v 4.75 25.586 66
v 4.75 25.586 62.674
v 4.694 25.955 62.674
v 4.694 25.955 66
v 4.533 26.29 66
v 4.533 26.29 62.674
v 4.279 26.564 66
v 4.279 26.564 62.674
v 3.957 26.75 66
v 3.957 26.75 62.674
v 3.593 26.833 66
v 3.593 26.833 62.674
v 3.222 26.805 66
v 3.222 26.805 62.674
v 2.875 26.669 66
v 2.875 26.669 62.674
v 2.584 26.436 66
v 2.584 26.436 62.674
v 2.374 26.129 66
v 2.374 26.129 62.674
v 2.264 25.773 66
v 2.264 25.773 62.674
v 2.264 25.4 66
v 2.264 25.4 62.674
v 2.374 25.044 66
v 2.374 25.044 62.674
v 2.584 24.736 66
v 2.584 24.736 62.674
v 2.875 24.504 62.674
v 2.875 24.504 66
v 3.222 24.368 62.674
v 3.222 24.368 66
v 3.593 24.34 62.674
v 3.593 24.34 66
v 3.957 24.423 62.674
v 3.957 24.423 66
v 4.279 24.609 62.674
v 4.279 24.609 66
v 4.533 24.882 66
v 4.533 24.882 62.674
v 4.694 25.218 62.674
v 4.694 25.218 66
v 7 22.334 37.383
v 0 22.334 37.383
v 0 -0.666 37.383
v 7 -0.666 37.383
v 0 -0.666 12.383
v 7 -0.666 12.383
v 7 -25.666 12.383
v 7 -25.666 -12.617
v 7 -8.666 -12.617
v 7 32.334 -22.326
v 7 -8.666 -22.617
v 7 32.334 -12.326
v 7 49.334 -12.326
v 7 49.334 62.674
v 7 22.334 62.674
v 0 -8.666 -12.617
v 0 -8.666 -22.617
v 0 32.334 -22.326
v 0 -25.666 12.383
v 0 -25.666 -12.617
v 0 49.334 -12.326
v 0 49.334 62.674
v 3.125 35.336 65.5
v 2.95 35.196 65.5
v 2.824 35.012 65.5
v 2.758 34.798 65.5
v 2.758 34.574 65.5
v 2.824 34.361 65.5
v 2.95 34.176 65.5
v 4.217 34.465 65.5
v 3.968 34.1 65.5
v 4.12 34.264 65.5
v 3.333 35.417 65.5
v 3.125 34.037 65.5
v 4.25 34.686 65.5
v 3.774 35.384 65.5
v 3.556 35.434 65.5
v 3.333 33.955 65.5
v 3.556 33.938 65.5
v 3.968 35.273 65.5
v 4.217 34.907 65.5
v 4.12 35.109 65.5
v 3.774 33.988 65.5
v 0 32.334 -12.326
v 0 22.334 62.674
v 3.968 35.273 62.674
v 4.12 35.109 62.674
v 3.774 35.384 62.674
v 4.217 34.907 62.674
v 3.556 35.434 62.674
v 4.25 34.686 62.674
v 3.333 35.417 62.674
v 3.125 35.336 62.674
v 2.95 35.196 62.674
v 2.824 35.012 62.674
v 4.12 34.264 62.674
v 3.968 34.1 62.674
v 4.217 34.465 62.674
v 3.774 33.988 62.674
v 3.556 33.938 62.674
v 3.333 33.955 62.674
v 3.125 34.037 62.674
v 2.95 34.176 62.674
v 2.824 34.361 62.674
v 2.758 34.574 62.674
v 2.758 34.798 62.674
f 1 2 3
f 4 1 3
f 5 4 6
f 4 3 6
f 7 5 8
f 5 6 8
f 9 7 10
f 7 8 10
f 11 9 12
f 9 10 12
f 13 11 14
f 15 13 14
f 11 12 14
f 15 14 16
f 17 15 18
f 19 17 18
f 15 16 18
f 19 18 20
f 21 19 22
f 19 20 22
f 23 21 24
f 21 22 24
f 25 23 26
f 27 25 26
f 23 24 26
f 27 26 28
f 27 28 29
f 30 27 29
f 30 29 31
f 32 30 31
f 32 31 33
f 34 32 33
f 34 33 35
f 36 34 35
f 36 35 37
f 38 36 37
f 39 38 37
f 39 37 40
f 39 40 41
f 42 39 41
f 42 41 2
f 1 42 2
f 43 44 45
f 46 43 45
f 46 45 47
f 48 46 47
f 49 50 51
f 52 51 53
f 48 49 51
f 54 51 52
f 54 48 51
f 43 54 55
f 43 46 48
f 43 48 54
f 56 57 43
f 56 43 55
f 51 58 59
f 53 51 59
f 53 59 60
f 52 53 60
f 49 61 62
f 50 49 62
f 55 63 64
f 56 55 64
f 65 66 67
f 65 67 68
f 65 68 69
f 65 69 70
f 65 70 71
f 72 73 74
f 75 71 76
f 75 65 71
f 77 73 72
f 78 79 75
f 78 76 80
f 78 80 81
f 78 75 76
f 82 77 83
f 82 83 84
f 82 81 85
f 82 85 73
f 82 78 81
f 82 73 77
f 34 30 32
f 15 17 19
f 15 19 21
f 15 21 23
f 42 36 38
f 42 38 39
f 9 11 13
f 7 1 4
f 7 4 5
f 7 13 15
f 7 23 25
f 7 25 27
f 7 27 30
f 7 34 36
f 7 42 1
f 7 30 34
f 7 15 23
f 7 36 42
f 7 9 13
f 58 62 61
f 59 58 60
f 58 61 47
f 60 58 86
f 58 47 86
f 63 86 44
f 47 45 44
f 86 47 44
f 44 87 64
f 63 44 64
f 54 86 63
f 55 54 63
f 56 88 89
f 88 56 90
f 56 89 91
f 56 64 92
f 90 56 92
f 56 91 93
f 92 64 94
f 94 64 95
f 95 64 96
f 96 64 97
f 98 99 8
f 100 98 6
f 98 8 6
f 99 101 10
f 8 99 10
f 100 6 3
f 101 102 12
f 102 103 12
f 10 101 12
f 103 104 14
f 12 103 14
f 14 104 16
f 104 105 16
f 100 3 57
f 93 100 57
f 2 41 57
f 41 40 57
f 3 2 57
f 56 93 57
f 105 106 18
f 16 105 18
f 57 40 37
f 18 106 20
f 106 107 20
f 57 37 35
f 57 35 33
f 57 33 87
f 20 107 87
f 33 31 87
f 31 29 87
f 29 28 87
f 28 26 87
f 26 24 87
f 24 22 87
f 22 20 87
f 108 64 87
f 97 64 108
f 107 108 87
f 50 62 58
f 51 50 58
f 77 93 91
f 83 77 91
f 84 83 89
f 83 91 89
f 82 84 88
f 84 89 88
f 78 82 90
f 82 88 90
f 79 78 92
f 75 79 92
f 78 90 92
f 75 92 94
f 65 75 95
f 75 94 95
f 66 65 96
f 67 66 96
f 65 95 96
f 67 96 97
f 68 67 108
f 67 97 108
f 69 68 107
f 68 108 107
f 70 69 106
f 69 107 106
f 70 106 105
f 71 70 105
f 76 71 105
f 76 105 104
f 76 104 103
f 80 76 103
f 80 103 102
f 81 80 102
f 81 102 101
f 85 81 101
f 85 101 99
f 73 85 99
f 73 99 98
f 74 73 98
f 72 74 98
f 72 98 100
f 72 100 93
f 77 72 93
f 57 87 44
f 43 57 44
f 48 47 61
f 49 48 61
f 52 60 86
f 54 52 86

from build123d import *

# Parameters (mm, degrees)
F1_DEPTH = 7
F2_R     = 1.25
F3_DEPTH = 25
F2_R_2   = 0.75
F4_DEPTH = 25
F5_DEPTH = 66
F6_DEPTH = 65.5


# Not quite as in the source:
# - a feature names something its author has since deleted; it is built from what else it names


with BuildPart() as f1:
    # F0 (on Right) → F1 (new body)
    with BuildSketch(Plane.YZ):
        Polygon((-25.6658861851, 12.3832505633), (-25.6658861851, -12.6167494367), (-8.6658861851, -12.6167494367), (-8.6658861851, -22.6167494367), (32.3341138149, -22.3259466936), (32.3341138149, -12.3259466936), (49.3341138149, -12.3259466936), (49.3341138149, 62.6740533064), (26.7576448203, 62.6740533064), (22.3341138149, 62.6740533064), (22.3341138149, 37.3832505633), (-0.6658861851, 37.3832505633), (-0.6658861851, 12.3832505633), align=None)
    extrude(amount=F1_DEPTH)



with BuildPart() as f3:
    # F2 (on Top) → F3 (new body)
    with BuildSketch(Plane.XY):
        with Locations((3.5, 25.5862374604)):
            Circle(F2_R)
    extrude(amount=F3_DEPTH)

    # F2 (on Top) → F4 (join)
    with BuildSketch(Plane.XY):
        with Locations((3.5, 25.5862374604)):
            Circle(F2_R)
    extrude(amount=F4_DEPTH)


with BuildPart() as f3b:
    # F2 (on Top) → F3, piece 2 (new body)
    with BuildSketch(Plane.XY):
        with Locations((3.5, 34.6862374604)):
            Circle(F2_R_2)
    extrude(amount=F3_DEPTH)

    # F2 (on Top) → F4, piece 2 (join)
    with BuildSketch(Plane.XY):
        with Locations((3.5, 34.6862374604)):
            Circle(F2_R_2)
    extrude(amount=F4_DEPTH)


with BuildPart() as f1_1:
    add(f1.part)

    add(f3.part)  # F5 merges F3
    # F2 (on Top) → F5 (join)
    with BuildSketch(Plane.XY):
        with Locations((3.5, 25.5862374604)):
            Circle(F2_R)
    extrude(amount=F5_DEPTH)


    add(f3b.part)  # F6 merges F3b
    # F2 (on Top) → F6 (join)
    with BuildSketch(Plane.XY):
        with Locations((3.5, 34.6862374604)):
            Circle(F2_R_2)
    extrude(amount=F6_DEPTH)


solid = f1_1.part
